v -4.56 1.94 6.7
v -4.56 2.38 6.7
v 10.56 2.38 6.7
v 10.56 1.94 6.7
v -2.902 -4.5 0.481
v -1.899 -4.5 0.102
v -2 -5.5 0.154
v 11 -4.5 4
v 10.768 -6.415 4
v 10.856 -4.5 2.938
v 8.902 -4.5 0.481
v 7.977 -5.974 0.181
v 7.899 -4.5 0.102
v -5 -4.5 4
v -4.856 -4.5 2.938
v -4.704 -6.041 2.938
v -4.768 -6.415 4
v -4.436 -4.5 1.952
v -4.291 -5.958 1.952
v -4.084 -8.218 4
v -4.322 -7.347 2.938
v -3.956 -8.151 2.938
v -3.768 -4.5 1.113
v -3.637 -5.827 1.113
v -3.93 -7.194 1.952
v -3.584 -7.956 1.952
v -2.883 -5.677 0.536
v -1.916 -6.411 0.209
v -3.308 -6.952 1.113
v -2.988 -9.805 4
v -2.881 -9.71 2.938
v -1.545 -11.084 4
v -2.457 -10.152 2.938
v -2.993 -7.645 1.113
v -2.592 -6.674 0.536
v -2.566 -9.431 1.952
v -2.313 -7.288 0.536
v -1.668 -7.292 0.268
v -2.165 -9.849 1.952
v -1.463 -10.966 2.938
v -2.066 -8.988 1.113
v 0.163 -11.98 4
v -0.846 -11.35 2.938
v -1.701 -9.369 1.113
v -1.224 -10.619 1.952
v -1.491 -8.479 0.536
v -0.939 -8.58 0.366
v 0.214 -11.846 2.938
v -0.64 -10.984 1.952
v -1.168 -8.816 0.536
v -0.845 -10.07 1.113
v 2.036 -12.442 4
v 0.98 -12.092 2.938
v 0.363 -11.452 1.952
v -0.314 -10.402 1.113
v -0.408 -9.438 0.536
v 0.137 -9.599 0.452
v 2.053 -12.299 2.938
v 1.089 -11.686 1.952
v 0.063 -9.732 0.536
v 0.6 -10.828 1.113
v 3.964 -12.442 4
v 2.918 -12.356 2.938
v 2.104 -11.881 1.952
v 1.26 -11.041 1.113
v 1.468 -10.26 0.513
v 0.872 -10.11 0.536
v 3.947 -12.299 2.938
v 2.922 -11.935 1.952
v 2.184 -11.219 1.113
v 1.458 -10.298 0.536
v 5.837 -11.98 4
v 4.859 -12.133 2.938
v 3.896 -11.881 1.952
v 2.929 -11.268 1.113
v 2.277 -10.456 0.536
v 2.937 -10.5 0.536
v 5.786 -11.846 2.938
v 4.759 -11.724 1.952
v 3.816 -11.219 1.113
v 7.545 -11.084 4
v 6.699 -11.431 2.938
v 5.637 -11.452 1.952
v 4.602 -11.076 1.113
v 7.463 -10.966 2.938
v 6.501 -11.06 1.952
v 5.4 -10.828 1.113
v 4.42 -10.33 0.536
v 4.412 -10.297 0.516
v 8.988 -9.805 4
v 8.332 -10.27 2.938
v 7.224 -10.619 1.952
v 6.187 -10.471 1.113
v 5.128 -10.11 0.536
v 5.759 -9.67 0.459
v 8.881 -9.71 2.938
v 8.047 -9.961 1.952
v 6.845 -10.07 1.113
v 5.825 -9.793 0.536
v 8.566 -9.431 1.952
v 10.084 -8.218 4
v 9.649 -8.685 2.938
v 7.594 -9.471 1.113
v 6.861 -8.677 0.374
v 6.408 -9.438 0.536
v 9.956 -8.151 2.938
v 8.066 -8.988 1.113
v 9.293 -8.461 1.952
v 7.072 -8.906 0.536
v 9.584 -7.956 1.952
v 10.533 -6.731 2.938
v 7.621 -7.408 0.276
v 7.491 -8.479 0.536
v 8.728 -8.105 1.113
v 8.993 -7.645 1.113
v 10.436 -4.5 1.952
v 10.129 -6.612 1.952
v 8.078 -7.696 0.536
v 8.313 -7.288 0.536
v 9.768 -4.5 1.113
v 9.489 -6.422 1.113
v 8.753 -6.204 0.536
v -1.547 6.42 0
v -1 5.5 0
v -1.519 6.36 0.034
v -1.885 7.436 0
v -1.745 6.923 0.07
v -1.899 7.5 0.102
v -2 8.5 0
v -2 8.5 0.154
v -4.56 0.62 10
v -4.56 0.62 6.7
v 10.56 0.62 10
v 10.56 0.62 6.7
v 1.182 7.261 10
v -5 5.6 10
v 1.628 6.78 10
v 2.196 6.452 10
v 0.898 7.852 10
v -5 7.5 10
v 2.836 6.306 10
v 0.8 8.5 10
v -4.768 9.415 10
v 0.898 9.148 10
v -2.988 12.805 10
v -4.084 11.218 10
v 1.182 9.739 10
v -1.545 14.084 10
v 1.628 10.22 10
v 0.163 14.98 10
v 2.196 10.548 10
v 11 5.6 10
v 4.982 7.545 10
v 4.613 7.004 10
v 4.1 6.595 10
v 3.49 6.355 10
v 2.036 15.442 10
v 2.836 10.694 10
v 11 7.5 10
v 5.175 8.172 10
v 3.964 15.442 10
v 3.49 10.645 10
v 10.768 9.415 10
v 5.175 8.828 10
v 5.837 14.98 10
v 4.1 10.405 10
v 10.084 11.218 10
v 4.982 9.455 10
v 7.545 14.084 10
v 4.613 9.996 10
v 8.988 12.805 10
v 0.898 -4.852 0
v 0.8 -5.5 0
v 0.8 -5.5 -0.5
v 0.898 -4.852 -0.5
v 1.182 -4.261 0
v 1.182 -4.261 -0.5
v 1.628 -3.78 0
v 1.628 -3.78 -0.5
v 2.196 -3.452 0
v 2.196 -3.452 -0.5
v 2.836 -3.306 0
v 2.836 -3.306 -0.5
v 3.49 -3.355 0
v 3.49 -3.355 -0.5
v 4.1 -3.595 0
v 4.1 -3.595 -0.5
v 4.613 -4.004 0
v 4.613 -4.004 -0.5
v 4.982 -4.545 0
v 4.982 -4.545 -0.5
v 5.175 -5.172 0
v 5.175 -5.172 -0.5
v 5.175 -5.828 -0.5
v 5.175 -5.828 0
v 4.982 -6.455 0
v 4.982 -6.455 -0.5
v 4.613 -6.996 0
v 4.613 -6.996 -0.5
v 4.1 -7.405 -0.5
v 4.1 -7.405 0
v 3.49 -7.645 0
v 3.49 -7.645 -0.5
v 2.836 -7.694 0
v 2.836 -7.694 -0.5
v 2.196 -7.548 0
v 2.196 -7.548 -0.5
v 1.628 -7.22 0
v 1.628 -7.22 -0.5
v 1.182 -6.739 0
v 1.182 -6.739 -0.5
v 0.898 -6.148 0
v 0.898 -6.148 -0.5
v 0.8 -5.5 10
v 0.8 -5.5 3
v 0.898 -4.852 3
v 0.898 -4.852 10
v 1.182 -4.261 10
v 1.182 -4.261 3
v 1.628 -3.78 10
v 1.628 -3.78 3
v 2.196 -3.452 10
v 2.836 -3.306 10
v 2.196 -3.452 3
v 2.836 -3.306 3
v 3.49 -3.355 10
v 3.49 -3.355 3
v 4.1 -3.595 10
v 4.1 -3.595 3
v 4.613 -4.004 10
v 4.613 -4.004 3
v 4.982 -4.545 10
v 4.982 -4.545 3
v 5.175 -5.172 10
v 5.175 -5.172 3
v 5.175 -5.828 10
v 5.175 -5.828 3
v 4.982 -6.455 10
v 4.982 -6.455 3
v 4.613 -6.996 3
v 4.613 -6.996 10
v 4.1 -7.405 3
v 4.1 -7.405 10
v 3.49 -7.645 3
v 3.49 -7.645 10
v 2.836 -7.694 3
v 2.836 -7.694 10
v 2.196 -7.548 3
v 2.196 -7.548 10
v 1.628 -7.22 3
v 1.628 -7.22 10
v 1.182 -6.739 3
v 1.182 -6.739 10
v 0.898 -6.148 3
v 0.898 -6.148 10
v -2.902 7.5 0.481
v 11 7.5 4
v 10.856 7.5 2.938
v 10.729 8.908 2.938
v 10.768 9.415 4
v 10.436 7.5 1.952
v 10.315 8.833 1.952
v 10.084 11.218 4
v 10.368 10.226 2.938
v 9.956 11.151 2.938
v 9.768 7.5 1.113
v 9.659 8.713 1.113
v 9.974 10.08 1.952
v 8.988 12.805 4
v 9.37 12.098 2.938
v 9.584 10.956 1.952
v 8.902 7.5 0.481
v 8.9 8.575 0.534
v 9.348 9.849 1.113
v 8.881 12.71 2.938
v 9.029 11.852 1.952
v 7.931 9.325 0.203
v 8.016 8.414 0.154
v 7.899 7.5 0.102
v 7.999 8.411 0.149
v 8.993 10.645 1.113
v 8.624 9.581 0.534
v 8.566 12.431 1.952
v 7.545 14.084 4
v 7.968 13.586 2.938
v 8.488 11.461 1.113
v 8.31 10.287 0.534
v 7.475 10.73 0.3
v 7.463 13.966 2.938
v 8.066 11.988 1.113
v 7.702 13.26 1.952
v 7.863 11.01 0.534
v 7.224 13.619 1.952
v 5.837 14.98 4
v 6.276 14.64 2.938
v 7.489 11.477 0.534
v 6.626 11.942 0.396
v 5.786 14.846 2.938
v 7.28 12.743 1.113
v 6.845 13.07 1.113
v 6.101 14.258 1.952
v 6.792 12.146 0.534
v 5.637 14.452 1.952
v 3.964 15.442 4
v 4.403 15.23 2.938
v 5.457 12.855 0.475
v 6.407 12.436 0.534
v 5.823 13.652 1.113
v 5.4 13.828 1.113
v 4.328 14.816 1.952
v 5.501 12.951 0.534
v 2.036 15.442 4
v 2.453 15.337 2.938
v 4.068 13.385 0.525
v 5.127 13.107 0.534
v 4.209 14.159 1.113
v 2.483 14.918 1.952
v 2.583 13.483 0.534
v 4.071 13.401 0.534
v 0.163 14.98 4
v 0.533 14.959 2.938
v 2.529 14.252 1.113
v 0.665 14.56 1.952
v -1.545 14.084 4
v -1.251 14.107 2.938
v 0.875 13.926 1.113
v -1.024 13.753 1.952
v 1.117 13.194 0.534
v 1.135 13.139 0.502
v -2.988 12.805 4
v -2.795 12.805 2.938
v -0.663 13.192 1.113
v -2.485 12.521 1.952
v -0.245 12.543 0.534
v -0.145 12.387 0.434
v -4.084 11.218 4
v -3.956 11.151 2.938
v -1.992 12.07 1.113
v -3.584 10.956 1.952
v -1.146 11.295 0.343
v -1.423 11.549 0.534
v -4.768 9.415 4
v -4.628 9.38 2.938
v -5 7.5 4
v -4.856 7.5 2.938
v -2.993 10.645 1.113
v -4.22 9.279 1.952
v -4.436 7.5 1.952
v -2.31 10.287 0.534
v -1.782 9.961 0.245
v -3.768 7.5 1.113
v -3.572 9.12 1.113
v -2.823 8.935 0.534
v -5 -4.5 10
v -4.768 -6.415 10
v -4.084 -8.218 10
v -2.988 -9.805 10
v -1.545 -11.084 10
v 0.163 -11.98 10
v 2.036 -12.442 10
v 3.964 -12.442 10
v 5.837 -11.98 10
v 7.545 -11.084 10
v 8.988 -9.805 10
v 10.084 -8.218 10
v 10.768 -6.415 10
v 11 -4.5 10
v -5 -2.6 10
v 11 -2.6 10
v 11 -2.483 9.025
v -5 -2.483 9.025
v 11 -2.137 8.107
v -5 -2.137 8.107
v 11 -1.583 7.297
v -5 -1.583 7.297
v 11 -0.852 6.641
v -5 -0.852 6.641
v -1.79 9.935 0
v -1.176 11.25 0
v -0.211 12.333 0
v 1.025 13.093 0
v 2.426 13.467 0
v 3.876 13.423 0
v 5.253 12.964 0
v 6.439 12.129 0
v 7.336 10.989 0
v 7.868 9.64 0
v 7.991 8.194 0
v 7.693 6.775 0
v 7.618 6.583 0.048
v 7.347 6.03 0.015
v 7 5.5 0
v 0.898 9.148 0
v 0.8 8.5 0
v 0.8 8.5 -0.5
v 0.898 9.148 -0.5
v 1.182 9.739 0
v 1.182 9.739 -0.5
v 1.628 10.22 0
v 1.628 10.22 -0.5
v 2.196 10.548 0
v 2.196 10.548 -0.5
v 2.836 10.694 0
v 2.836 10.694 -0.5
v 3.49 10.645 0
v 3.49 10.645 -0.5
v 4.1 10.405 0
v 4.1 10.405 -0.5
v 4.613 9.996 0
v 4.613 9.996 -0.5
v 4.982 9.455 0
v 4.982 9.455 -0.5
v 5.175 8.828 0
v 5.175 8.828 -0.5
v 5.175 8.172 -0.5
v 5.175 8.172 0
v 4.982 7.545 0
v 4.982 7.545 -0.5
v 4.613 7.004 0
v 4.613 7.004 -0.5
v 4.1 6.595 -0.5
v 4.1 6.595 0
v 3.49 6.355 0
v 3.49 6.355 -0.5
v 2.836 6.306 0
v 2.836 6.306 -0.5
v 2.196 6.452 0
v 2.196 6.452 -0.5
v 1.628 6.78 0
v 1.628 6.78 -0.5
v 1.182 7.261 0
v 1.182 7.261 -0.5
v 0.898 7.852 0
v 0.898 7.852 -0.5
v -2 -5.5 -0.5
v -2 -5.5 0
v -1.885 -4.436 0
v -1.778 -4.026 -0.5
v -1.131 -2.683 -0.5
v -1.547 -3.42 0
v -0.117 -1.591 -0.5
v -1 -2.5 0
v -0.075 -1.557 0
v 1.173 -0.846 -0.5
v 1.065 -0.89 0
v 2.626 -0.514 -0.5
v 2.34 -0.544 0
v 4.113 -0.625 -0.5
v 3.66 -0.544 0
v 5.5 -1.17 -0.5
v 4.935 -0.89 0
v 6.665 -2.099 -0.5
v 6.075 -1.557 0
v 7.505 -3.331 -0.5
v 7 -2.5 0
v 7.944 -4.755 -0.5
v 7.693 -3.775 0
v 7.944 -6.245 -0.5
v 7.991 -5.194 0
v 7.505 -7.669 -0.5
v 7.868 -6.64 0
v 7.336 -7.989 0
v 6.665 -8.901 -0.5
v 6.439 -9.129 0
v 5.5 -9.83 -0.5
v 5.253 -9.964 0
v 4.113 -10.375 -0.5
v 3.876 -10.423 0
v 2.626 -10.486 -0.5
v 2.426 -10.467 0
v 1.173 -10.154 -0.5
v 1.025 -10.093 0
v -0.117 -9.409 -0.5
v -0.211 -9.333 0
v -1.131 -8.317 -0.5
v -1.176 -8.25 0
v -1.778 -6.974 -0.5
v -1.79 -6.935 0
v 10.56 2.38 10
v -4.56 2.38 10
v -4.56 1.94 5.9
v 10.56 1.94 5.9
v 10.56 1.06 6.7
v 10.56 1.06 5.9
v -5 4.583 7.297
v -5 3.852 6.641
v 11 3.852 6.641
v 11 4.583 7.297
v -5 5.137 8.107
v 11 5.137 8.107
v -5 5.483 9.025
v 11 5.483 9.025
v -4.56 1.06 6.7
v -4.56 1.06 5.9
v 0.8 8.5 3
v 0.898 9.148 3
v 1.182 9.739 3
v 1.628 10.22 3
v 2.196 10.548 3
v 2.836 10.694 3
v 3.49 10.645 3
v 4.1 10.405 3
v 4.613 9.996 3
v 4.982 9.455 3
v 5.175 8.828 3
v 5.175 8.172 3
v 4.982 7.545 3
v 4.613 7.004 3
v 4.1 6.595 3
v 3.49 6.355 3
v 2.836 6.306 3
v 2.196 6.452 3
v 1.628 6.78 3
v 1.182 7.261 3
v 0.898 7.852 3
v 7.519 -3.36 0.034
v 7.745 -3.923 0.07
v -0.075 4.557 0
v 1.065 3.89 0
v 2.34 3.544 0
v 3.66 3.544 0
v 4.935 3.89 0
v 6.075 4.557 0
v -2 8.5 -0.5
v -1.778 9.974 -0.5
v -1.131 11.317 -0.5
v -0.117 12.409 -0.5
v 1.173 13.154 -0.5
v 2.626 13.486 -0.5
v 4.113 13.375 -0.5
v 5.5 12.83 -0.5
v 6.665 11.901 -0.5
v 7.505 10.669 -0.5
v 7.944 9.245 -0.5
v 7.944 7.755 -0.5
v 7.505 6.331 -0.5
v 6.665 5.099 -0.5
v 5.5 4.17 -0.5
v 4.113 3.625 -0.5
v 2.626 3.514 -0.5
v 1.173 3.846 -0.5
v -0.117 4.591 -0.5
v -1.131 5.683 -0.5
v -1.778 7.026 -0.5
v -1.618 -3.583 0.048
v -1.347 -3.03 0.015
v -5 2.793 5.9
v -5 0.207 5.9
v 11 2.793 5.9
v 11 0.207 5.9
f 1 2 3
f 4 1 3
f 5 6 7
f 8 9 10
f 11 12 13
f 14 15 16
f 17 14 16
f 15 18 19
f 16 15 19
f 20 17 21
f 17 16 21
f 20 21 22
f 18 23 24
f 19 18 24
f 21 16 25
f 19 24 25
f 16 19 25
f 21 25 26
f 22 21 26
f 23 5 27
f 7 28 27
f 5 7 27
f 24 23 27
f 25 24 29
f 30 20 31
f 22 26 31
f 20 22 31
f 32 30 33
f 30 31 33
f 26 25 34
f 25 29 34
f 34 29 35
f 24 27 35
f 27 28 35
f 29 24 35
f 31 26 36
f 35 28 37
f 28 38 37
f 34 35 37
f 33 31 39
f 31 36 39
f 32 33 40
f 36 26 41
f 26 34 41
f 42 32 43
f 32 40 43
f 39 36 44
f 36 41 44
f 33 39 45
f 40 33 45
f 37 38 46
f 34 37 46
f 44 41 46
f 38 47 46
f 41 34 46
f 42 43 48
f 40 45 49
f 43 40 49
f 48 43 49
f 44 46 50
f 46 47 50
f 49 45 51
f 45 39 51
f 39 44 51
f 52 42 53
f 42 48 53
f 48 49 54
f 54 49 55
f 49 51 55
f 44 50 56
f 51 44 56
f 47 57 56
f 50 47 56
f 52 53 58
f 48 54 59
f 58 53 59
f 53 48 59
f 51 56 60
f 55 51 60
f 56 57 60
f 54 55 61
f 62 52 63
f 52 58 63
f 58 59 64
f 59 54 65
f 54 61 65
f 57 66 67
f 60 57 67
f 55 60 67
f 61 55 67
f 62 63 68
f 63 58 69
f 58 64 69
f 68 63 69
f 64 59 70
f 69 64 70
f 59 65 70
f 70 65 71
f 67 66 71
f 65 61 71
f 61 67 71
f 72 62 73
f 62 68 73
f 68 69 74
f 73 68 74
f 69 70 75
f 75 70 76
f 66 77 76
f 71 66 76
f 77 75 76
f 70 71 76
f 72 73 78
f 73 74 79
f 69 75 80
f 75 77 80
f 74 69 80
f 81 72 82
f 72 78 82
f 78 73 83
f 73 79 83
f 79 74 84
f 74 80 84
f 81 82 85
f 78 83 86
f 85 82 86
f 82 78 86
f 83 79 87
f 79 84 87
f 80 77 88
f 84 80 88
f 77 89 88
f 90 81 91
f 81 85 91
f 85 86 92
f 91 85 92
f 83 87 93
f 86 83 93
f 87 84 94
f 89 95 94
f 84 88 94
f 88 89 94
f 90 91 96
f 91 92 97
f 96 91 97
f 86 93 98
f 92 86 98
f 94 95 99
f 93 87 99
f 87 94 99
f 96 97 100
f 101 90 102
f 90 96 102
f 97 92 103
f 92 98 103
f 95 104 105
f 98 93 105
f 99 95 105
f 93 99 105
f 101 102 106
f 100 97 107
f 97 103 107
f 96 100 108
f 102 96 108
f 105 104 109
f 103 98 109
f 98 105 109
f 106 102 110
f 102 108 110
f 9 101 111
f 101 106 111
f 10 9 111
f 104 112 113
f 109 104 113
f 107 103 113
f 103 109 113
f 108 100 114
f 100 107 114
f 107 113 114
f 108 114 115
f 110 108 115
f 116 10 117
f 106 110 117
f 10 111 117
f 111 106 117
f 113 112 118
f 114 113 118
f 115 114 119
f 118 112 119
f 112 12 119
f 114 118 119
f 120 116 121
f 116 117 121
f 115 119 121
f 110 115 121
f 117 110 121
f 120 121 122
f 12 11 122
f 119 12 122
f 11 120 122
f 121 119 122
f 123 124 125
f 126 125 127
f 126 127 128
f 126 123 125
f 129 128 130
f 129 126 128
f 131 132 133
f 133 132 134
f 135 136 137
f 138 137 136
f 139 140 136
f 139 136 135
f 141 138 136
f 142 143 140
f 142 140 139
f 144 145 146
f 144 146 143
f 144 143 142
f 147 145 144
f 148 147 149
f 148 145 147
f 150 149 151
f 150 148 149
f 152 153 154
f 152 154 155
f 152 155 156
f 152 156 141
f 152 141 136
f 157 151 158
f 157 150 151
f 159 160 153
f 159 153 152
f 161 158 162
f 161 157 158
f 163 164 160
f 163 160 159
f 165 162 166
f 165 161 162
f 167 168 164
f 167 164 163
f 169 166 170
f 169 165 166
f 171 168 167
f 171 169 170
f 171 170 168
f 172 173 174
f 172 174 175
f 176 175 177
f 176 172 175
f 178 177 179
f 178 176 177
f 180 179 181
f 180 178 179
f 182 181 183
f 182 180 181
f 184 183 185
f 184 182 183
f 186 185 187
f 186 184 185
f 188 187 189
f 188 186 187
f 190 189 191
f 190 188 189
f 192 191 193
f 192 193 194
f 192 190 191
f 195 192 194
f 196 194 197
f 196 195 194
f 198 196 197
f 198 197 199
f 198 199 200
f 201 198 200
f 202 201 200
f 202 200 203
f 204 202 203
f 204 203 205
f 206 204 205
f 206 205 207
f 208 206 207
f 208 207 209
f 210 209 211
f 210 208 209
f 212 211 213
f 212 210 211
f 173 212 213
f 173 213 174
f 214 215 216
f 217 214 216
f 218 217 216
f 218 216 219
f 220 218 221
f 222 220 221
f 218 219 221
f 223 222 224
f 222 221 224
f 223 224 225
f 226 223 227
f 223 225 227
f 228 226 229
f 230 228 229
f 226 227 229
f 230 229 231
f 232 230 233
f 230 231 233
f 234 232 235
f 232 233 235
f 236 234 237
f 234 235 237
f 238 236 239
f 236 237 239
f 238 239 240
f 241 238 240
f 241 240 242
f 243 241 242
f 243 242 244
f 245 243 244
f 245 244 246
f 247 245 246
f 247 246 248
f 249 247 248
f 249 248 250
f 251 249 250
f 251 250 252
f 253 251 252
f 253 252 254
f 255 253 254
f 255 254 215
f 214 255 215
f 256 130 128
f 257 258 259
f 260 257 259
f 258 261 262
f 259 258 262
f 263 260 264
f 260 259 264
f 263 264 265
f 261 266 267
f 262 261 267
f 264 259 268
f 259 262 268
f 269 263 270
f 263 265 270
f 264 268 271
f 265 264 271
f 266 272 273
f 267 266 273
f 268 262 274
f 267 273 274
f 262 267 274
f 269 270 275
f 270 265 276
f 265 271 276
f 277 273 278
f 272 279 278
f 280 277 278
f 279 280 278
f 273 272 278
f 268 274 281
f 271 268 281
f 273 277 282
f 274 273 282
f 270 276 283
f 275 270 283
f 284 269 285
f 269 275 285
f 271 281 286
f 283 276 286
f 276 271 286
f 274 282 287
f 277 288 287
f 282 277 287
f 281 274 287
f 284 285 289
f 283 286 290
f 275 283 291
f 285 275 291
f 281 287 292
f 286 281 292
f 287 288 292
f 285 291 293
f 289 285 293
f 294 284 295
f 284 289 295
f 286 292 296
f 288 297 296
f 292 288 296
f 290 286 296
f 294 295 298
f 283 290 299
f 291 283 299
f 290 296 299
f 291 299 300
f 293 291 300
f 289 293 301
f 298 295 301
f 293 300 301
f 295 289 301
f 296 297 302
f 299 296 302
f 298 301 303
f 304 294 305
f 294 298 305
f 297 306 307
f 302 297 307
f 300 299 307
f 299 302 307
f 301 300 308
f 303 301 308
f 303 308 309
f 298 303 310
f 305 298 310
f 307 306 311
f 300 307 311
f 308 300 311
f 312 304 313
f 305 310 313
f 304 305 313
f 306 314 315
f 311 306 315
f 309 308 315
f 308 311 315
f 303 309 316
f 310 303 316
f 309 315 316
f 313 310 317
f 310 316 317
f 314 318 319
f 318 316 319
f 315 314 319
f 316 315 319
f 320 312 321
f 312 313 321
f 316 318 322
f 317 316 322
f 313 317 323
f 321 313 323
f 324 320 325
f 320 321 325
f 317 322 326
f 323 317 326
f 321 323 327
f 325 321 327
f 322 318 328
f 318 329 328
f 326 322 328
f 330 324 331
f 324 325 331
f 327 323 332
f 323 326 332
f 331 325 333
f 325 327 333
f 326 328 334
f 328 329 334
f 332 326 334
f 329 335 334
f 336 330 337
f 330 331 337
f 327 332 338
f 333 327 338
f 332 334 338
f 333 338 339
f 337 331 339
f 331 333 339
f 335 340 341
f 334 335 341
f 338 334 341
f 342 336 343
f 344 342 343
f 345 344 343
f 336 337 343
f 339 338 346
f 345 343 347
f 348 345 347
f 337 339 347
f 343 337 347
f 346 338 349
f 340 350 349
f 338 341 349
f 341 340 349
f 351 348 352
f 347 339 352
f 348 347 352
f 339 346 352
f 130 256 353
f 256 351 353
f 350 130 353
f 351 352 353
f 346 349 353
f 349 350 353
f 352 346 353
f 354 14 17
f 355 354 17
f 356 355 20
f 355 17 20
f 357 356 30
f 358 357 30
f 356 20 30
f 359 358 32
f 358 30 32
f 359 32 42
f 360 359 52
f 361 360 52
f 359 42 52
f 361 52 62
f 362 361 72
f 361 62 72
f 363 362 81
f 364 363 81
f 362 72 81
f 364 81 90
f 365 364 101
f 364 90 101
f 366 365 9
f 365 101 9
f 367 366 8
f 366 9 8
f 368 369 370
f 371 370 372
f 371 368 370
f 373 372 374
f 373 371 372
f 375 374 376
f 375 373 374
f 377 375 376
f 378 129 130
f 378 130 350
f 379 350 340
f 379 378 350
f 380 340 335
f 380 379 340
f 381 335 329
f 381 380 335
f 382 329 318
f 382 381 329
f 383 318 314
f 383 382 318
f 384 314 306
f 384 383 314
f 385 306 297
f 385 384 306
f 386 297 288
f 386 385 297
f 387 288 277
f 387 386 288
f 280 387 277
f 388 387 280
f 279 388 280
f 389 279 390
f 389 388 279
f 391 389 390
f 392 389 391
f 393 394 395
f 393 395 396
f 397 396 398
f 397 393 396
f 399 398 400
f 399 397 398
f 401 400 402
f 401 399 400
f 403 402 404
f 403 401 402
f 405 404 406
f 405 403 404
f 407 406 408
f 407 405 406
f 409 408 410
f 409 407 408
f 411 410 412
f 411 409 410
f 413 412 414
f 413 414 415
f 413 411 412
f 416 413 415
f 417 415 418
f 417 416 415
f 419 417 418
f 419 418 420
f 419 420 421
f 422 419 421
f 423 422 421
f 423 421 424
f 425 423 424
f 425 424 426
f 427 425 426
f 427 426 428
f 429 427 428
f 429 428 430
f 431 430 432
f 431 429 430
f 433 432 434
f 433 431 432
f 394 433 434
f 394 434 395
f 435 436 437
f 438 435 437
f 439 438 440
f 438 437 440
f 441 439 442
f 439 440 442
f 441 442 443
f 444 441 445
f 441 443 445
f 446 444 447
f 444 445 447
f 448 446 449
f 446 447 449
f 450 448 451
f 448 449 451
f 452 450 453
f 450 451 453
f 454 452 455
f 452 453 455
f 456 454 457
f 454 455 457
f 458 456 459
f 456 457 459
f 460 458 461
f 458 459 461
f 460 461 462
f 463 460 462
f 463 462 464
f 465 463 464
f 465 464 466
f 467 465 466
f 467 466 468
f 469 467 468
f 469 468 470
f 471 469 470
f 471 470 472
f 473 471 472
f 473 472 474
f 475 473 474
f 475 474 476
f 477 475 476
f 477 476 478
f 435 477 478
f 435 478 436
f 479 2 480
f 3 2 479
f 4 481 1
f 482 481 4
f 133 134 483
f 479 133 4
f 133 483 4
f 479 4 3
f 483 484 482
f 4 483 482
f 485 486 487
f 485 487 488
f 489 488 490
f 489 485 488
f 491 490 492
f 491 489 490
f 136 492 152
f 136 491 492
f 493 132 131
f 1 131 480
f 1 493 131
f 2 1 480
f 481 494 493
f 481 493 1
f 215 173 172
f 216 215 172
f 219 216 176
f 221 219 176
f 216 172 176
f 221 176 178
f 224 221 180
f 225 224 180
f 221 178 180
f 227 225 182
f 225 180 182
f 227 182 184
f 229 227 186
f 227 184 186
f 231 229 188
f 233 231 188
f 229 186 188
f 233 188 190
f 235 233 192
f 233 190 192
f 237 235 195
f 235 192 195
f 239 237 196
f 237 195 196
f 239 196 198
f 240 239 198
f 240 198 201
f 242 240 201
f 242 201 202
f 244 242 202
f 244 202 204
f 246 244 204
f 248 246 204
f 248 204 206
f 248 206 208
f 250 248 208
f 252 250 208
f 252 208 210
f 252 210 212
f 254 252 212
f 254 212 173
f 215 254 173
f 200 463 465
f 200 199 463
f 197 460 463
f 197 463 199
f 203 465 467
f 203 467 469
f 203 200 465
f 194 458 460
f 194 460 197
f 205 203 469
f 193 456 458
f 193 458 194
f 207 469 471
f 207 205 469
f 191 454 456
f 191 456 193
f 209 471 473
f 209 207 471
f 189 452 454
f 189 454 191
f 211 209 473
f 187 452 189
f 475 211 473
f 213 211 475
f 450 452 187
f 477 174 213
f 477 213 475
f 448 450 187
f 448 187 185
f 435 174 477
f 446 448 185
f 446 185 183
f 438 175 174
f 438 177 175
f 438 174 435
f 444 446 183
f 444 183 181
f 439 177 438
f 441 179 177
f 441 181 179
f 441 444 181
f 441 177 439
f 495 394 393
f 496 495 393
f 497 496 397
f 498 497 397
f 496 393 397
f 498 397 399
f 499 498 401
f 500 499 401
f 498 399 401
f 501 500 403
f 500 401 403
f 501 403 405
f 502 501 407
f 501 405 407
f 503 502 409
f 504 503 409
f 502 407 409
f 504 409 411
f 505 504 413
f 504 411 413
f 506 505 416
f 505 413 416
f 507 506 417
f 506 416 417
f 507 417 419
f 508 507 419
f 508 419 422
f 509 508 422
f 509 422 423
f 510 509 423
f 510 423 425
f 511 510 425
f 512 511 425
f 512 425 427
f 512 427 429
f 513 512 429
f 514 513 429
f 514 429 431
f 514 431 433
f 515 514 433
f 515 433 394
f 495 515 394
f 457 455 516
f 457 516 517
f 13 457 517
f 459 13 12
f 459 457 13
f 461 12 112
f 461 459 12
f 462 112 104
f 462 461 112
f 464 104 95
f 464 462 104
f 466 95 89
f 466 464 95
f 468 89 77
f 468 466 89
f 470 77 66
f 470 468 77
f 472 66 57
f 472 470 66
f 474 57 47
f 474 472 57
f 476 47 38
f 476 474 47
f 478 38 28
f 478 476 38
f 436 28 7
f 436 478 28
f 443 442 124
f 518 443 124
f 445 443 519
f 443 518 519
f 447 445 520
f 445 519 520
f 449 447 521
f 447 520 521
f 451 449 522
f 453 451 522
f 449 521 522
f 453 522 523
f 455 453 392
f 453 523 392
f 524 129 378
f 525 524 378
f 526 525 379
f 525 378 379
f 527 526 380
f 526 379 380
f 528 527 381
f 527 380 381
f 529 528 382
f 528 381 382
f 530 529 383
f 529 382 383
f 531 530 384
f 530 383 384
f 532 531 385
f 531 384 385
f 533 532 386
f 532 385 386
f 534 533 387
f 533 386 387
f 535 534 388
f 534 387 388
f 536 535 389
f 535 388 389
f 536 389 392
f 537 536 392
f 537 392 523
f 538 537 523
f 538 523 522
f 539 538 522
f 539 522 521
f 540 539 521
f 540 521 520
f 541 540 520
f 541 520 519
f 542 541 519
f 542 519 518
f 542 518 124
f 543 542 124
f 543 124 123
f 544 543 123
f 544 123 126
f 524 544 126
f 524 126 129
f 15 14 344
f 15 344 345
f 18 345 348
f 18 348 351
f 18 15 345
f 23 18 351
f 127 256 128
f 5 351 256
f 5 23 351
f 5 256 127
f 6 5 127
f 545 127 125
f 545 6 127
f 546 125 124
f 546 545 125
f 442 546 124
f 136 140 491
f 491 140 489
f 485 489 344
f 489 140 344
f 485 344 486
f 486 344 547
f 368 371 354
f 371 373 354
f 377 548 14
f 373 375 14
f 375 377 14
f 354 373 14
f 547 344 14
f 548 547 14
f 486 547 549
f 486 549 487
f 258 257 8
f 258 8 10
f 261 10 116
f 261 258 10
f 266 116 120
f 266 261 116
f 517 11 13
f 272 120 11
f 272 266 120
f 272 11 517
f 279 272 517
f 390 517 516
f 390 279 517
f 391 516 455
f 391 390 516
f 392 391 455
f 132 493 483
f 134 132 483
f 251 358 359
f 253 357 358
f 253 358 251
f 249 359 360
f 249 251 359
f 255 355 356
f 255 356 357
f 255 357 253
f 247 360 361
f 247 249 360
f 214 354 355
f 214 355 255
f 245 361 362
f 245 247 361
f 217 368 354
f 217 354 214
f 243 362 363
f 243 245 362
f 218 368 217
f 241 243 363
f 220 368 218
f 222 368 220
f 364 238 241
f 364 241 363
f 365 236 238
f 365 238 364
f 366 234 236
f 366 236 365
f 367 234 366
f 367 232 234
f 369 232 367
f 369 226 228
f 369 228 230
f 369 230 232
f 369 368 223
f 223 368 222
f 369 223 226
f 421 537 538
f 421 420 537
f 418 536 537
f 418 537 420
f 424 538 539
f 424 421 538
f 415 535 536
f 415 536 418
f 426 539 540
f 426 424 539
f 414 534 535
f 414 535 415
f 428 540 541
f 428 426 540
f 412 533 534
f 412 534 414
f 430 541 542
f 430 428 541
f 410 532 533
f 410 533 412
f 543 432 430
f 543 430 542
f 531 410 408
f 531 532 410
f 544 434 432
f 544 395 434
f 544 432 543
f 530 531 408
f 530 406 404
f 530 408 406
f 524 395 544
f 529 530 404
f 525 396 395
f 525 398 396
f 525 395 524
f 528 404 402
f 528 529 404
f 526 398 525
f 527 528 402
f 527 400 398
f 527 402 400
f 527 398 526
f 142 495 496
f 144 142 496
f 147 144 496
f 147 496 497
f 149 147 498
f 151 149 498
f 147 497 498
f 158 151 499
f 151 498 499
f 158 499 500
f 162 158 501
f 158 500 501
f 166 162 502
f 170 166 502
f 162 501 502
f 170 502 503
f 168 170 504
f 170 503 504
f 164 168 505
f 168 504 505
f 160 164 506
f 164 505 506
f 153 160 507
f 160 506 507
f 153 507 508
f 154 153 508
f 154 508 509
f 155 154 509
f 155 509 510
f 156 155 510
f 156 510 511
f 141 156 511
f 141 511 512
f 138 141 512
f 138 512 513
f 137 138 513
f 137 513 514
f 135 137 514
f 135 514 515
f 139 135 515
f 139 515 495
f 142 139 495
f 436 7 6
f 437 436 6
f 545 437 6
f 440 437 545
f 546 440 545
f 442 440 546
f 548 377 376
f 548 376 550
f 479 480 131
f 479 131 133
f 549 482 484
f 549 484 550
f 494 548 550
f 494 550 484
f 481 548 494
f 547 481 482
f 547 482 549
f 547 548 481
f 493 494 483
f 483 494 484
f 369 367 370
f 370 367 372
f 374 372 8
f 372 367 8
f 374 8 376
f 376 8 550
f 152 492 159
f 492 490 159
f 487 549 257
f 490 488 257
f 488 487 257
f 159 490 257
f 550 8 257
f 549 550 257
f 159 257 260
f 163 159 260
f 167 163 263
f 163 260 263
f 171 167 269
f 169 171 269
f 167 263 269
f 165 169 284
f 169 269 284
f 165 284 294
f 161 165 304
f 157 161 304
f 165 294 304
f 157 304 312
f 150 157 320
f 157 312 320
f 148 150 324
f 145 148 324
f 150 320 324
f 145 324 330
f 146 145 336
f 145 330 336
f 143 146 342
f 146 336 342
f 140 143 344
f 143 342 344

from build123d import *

# Parameters (mm, degrees)
BOSS_EXTRUDE1_DEPTH      = 10
CUT_EXTRUDE3_DEPTH       = 17
SKETCH5_R                = 2.2
CUT_EXTRUDE4_DEPTH       = 11
FILLET2_R                = 4
SKETCH7_R                = 5
SKETCH7_R_2              = 2.2
BOSS_EXTRUDE2_DEPTH      = 0.5
BOSS_EXTRUDE2_DEPTH_BACK = 3
SKETCH8_W                = 15.12
SKETCH8_H                = 0.88
BOSS_EXTRUDE3_DEPTH      = 0.8
SKETCH9_W                = 15.12
SKETCH9_H                = 1.76
BOSS_EXTRUDE4_DEPTH      = 3.3


with BuildPart() as part:
    # Sketch1 → Boss-Extrude1 (new body)
    with BuildSketch(Plane.XY):
        with BuildLine():
            Line((-5, 7.5), (-5, -4.5))
            ThreePointArc((-5, -4.5), (3, -12.5), (11, -4.5))
            Line((11, -4.5), (11, 7.5))
            ThreePointArc((11, 7.5), (3, 15.5), (-5, 7.5))
        make_face()
    extrude(amount=BOSS_EXTRUDE1_DEPTH)

    # Sketch4 → Cut-Extrude3 (cut, through all)
    with BuildSketch(Plane.ZY.offset(5)):
        with BuildLine():
            Line((6.641476618, -0.851663389), (5.9, 0.207274966))
            Line((5.9, 0.207274966), (5.9, 2.792725034))
            Line((5.9, 2.792725034), (6.641476618, 3.851663389))
            ThreePointArc((6.641476618, 3.851663389), (14.1, 1.5), (6.641476618, -0.851663389))
        make_face()
    extrude(amount=-CUT_EXTRUDE3_DEPTH, mode=Mode.SUBTRACT)

    # Sketch5 → Cut-Extrude4 (cut, through all)
    with BuildSketch(Plane(origin=(0, 0, 0), x_dir=(-1, 0, 0), z_dir=(0, 0, -1))):
        with Locations((-3, 8.5)):
            Circle(SKETCH5_R)
        with Locations((-3, -5.5)):
            Circle(SKETCH5_R)
    extrude(amount=-CUT_EXTRUDE4_DEPTH, mode=Mode.SUBTRACT)

    # Fillet2
    fillet2_edges = [part.edges().sort_by_distance(p)[0] for p in [
        (-5, 1.5, 0),
        (3, 15.5, 0),
        (11, 1.5, 0),
        (3, -12.5, 0),
    ]]
    fillet(fillet2_edges, radius=FILLET2_R)

    # Sketch7 → Boss-Extrude2 (add, two sides)
    with BuildSketch(Plane(origin=(0, 0, 0), x_dir=(-1, 0, 0), z_dir=(0, 0, -1))) as boss_extrude2_sk:
        with Locations((-3, 8.5)):
            Circle(SKETCH7_R)
        with Locations((-3, 8.5)):
            Circle(SKETCH7_R_2, mode=Mode.SUBTRACT)
        with Locations((-3, -5.5)):
            Circle(SKETCH7_R)
        with Locations((-3, -5.5)):
            Circle(SKETCH7_R_2, mode=Mode.SUBTRACT)
    extrude(amount=BOSS_EXTRUDE2_DEPTH)
    extrude(boss_extrude2_sk.sketch, amount=-BOSS_EXTRUDE2_DEPTH_BACK)

    # Sketch8 → Boss-Extrude3 (add)
    with BuildSketch(Plane.XY.offset(5.9)):
        with Locations((3, 1.5)):
            Rectangle(SKETCH8_W, SKETCH8_H)
    extrude(amount=BOSS_EXTRUDE3_DEPTH)

    # Sketch9 → Boss-Extrude4 (add)
    with BuildSketch(Plane.XY.offset(6.7)):
        with Locations((3, 1.5)):
            Rectangle(SKETCH9_W, SKETCH9_H)
    extrude(amount=BOSS_EXTRUDE4_DEPTH)


solid = part.part
